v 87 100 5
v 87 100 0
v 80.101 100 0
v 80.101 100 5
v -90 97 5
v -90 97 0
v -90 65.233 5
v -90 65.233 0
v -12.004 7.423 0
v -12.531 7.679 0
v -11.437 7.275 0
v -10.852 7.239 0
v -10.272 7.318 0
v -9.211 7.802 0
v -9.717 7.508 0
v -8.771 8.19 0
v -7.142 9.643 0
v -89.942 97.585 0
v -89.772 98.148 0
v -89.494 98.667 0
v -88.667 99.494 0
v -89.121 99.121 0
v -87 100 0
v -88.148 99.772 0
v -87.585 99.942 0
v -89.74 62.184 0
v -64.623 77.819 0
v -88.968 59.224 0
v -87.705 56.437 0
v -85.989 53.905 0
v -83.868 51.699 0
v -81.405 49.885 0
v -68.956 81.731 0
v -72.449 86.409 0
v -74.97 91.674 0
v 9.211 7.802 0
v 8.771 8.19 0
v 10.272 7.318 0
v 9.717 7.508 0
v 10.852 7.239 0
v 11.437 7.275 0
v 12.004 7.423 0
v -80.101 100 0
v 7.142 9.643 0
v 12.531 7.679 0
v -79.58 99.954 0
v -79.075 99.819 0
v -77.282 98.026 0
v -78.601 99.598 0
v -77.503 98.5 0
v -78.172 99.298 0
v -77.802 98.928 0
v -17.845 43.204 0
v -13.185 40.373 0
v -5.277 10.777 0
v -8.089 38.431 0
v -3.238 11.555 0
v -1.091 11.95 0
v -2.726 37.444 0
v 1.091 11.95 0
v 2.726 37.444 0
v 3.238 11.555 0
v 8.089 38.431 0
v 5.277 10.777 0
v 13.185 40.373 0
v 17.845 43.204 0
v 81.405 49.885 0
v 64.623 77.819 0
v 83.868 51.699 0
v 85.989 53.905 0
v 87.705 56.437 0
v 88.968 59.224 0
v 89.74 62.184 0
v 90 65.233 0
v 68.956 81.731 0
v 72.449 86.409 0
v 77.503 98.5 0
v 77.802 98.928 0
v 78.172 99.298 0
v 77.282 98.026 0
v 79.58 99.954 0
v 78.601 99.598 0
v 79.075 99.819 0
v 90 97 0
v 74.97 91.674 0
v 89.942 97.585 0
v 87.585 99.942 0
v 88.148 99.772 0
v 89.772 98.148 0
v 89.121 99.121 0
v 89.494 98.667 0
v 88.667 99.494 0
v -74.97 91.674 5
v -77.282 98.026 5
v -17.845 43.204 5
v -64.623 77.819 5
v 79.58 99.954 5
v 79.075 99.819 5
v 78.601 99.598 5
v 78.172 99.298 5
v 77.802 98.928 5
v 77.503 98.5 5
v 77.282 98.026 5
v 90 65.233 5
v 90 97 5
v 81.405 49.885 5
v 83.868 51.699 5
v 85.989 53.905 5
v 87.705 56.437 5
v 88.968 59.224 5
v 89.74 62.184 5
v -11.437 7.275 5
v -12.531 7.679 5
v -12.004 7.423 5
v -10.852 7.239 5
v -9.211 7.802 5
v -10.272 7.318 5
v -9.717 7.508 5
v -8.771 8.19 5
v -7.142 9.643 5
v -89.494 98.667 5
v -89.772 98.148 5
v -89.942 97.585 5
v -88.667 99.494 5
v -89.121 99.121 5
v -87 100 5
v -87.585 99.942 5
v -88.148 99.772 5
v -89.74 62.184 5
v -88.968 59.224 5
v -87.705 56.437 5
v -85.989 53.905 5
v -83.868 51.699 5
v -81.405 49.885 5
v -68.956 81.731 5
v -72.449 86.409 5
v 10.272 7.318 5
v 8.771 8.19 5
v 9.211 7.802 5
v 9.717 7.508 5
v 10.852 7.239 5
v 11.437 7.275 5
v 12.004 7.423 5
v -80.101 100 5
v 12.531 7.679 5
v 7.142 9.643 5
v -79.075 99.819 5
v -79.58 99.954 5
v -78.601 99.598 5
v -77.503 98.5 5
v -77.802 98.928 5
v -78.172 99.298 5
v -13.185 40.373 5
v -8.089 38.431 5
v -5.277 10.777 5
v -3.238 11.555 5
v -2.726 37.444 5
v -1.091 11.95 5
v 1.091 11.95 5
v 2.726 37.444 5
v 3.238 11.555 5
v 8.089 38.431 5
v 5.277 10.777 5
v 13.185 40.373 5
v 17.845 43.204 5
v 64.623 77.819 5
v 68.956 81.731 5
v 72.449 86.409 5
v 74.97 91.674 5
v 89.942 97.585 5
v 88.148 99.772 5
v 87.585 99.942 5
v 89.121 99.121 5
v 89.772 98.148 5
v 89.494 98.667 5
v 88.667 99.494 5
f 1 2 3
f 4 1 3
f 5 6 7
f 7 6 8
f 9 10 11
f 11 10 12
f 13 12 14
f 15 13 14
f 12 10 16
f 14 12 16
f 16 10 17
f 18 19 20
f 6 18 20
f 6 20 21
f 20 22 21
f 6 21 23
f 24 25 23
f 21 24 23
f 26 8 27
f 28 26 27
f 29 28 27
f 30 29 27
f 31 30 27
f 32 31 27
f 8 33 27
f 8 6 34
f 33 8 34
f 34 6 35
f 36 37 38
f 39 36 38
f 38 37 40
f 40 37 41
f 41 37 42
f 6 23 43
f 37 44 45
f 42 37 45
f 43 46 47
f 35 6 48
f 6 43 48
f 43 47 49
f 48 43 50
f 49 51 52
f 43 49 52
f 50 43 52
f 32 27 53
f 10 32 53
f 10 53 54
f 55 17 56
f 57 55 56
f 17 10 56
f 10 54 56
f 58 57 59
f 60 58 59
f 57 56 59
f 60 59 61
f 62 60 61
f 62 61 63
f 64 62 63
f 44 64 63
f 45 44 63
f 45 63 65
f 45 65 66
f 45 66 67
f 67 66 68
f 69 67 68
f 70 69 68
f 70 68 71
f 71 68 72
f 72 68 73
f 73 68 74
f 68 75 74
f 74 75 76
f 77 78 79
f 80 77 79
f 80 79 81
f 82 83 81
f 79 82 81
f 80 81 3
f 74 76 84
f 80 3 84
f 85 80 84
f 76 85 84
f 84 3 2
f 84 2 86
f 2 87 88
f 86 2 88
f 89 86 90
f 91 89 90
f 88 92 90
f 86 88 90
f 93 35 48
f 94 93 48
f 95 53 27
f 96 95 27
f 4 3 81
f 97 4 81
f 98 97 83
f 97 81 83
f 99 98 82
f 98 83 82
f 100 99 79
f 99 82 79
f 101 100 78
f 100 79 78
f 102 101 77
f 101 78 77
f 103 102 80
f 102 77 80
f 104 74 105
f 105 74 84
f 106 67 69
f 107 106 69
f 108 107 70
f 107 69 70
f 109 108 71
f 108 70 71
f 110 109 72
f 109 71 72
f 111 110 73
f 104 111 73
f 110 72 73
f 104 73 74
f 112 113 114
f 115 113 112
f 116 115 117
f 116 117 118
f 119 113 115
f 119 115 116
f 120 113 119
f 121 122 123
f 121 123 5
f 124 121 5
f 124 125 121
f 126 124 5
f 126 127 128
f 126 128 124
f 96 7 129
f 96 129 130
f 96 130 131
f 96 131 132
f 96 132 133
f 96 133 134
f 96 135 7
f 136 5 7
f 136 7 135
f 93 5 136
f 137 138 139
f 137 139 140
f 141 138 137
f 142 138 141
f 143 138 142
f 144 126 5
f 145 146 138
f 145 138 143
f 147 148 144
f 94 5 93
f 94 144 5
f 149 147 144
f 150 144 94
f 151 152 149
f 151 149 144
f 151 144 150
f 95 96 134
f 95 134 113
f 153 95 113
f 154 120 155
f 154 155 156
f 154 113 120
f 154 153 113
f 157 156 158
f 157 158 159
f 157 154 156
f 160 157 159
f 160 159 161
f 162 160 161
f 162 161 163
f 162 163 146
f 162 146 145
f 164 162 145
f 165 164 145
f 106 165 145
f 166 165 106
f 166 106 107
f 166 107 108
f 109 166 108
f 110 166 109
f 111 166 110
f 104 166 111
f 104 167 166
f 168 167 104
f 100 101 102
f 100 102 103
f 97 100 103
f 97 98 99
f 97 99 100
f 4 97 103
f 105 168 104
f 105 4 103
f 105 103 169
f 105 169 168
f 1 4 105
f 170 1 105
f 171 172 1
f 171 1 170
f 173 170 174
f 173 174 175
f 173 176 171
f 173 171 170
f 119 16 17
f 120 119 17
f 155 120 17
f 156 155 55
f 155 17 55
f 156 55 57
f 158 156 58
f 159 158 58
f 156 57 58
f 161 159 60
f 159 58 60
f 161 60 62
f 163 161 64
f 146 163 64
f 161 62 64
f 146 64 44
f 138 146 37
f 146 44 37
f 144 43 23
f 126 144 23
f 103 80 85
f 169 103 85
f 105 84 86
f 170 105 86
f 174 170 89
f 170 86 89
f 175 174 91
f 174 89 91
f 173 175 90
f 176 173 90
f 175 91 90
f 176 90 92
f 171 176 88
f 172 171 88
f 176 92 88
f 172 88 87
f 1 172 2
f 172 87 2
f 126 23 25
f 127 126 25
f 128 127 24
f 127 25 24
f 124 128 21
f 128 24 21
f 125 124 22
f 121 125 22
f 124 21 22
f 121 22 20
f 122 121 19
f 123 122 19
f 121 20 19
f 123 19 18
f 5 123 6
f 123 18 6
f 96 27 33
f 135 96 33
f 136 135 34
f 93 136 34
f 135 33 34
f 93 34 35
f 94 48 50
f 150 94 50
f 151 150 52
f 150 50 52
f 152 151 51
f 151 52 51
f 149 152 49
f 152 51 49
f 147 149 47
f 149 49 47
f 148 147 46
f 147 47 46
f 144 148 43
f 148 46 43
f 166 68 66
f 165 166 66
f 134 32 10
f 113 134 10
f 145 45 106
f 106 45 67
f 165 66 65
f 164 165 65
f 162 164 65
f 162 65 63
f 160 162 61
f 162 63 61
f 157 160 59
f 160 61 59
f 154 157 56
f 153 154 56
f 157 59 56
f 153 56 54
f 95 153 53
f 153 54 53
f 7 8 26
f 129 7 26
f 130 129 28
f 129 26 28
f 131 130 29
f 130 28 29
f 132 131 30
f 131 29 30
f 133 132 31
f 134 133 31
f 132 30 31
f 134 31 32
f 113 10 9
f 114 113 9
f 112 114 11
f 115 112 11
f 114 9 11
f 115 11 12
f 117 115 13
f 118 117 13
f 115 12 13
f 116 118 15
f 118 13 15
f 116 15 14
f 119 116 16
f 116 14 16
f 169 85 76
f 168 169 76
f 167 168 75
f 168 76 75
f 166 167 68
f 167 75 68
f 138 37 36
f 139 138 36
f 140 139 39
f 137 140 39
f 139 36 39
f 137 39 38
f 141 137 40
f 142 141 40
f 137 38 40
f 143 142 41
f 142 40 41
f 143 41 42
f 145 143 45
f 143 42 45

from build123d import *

# Parameters (mm, degrees)
BASE_EXTRUDE_DEPTH = 5


with BuildPart() as part:
    # Sketch1 → Base-Extrude (new body)
    with BuildSketch(Plane.XY):
        with BuildLine():
            Line((-90, 97), (-90, 65.232555285))
            ThreePointArc((-90, 65.232555285), (-87.704928127, 56.437372938), (-81.404974165, 49.885032327))
            Line((-81.404974165, 49.885032327), (-12.531200021, 7.679129249))
            ThreePointArc((-12.531200021, 7.679129249), (-10.560110304, 7.264321725), (-8.770963462, 8.189639794))
            ThreePointArc((-8.770963462, 8.189639794), (0, 12), (8.770963462, 8.189639794))
            ThreePointArc((8.770963462, 8.189639794), (10.560110304, 7.264321725), (12.531200021, 7.679129249))
            Line((12.531200021, 7.679129249), (81.404974165, 49.885032327))
            ThreePointArc((81.404974165, 49.885032327), (87.704928127, 56.437372938), (90, 65.232555285))
            Line((90, 65.232555285), (90, 97))
            ThreePointArc((90, 97), (89.121320344, 99.121320344), (87, 100))
            Line((87, 100), (80.100622615, 100))
            ThreePointArc((80.100622615, 100), (78.379893306, 99.457456133), (77.281544752, 98.02606043))
            Line((77.281544752, 98.02606043), (74.969567775, 91.67395589))
            ThreePointArc((74.969567775, 91.67395589), (70.816403532, 83.984822172), (64.623472754, 77.818854371))
            Line((64.623472754, 77.818854371), (17.844683603, 43.204371262))
            ThreePointArc((17.844683603, 43.204371262), (0, 37.320077081), (-17.844683603, 43.204371262))
            Line((-17.844683603, 43.204371262), (-64.623472754, 77.818854371))
            ThreePointArc((-64.623472754, 77.818854371), (-70.816403532, 83.984822172), (-74.969567775, 91.67395589))
            Line((-74.969567775, 91.67395589), (-77.281544752, 98.02606043))
            ThreePointArc((-77.281544752, 98.02606043), (-78.379893306, 99.457456133), (-80.100622615, 100))
            Line((-80.100622615, 100), (-87, 100))
            ThreePointArc((-87, 100), (-89.121320344, 99.121320344), (-90, 97))
        make_face()
    extrude(amount=BASE_EXTRUDE_DEPTH)


solid = part.part
